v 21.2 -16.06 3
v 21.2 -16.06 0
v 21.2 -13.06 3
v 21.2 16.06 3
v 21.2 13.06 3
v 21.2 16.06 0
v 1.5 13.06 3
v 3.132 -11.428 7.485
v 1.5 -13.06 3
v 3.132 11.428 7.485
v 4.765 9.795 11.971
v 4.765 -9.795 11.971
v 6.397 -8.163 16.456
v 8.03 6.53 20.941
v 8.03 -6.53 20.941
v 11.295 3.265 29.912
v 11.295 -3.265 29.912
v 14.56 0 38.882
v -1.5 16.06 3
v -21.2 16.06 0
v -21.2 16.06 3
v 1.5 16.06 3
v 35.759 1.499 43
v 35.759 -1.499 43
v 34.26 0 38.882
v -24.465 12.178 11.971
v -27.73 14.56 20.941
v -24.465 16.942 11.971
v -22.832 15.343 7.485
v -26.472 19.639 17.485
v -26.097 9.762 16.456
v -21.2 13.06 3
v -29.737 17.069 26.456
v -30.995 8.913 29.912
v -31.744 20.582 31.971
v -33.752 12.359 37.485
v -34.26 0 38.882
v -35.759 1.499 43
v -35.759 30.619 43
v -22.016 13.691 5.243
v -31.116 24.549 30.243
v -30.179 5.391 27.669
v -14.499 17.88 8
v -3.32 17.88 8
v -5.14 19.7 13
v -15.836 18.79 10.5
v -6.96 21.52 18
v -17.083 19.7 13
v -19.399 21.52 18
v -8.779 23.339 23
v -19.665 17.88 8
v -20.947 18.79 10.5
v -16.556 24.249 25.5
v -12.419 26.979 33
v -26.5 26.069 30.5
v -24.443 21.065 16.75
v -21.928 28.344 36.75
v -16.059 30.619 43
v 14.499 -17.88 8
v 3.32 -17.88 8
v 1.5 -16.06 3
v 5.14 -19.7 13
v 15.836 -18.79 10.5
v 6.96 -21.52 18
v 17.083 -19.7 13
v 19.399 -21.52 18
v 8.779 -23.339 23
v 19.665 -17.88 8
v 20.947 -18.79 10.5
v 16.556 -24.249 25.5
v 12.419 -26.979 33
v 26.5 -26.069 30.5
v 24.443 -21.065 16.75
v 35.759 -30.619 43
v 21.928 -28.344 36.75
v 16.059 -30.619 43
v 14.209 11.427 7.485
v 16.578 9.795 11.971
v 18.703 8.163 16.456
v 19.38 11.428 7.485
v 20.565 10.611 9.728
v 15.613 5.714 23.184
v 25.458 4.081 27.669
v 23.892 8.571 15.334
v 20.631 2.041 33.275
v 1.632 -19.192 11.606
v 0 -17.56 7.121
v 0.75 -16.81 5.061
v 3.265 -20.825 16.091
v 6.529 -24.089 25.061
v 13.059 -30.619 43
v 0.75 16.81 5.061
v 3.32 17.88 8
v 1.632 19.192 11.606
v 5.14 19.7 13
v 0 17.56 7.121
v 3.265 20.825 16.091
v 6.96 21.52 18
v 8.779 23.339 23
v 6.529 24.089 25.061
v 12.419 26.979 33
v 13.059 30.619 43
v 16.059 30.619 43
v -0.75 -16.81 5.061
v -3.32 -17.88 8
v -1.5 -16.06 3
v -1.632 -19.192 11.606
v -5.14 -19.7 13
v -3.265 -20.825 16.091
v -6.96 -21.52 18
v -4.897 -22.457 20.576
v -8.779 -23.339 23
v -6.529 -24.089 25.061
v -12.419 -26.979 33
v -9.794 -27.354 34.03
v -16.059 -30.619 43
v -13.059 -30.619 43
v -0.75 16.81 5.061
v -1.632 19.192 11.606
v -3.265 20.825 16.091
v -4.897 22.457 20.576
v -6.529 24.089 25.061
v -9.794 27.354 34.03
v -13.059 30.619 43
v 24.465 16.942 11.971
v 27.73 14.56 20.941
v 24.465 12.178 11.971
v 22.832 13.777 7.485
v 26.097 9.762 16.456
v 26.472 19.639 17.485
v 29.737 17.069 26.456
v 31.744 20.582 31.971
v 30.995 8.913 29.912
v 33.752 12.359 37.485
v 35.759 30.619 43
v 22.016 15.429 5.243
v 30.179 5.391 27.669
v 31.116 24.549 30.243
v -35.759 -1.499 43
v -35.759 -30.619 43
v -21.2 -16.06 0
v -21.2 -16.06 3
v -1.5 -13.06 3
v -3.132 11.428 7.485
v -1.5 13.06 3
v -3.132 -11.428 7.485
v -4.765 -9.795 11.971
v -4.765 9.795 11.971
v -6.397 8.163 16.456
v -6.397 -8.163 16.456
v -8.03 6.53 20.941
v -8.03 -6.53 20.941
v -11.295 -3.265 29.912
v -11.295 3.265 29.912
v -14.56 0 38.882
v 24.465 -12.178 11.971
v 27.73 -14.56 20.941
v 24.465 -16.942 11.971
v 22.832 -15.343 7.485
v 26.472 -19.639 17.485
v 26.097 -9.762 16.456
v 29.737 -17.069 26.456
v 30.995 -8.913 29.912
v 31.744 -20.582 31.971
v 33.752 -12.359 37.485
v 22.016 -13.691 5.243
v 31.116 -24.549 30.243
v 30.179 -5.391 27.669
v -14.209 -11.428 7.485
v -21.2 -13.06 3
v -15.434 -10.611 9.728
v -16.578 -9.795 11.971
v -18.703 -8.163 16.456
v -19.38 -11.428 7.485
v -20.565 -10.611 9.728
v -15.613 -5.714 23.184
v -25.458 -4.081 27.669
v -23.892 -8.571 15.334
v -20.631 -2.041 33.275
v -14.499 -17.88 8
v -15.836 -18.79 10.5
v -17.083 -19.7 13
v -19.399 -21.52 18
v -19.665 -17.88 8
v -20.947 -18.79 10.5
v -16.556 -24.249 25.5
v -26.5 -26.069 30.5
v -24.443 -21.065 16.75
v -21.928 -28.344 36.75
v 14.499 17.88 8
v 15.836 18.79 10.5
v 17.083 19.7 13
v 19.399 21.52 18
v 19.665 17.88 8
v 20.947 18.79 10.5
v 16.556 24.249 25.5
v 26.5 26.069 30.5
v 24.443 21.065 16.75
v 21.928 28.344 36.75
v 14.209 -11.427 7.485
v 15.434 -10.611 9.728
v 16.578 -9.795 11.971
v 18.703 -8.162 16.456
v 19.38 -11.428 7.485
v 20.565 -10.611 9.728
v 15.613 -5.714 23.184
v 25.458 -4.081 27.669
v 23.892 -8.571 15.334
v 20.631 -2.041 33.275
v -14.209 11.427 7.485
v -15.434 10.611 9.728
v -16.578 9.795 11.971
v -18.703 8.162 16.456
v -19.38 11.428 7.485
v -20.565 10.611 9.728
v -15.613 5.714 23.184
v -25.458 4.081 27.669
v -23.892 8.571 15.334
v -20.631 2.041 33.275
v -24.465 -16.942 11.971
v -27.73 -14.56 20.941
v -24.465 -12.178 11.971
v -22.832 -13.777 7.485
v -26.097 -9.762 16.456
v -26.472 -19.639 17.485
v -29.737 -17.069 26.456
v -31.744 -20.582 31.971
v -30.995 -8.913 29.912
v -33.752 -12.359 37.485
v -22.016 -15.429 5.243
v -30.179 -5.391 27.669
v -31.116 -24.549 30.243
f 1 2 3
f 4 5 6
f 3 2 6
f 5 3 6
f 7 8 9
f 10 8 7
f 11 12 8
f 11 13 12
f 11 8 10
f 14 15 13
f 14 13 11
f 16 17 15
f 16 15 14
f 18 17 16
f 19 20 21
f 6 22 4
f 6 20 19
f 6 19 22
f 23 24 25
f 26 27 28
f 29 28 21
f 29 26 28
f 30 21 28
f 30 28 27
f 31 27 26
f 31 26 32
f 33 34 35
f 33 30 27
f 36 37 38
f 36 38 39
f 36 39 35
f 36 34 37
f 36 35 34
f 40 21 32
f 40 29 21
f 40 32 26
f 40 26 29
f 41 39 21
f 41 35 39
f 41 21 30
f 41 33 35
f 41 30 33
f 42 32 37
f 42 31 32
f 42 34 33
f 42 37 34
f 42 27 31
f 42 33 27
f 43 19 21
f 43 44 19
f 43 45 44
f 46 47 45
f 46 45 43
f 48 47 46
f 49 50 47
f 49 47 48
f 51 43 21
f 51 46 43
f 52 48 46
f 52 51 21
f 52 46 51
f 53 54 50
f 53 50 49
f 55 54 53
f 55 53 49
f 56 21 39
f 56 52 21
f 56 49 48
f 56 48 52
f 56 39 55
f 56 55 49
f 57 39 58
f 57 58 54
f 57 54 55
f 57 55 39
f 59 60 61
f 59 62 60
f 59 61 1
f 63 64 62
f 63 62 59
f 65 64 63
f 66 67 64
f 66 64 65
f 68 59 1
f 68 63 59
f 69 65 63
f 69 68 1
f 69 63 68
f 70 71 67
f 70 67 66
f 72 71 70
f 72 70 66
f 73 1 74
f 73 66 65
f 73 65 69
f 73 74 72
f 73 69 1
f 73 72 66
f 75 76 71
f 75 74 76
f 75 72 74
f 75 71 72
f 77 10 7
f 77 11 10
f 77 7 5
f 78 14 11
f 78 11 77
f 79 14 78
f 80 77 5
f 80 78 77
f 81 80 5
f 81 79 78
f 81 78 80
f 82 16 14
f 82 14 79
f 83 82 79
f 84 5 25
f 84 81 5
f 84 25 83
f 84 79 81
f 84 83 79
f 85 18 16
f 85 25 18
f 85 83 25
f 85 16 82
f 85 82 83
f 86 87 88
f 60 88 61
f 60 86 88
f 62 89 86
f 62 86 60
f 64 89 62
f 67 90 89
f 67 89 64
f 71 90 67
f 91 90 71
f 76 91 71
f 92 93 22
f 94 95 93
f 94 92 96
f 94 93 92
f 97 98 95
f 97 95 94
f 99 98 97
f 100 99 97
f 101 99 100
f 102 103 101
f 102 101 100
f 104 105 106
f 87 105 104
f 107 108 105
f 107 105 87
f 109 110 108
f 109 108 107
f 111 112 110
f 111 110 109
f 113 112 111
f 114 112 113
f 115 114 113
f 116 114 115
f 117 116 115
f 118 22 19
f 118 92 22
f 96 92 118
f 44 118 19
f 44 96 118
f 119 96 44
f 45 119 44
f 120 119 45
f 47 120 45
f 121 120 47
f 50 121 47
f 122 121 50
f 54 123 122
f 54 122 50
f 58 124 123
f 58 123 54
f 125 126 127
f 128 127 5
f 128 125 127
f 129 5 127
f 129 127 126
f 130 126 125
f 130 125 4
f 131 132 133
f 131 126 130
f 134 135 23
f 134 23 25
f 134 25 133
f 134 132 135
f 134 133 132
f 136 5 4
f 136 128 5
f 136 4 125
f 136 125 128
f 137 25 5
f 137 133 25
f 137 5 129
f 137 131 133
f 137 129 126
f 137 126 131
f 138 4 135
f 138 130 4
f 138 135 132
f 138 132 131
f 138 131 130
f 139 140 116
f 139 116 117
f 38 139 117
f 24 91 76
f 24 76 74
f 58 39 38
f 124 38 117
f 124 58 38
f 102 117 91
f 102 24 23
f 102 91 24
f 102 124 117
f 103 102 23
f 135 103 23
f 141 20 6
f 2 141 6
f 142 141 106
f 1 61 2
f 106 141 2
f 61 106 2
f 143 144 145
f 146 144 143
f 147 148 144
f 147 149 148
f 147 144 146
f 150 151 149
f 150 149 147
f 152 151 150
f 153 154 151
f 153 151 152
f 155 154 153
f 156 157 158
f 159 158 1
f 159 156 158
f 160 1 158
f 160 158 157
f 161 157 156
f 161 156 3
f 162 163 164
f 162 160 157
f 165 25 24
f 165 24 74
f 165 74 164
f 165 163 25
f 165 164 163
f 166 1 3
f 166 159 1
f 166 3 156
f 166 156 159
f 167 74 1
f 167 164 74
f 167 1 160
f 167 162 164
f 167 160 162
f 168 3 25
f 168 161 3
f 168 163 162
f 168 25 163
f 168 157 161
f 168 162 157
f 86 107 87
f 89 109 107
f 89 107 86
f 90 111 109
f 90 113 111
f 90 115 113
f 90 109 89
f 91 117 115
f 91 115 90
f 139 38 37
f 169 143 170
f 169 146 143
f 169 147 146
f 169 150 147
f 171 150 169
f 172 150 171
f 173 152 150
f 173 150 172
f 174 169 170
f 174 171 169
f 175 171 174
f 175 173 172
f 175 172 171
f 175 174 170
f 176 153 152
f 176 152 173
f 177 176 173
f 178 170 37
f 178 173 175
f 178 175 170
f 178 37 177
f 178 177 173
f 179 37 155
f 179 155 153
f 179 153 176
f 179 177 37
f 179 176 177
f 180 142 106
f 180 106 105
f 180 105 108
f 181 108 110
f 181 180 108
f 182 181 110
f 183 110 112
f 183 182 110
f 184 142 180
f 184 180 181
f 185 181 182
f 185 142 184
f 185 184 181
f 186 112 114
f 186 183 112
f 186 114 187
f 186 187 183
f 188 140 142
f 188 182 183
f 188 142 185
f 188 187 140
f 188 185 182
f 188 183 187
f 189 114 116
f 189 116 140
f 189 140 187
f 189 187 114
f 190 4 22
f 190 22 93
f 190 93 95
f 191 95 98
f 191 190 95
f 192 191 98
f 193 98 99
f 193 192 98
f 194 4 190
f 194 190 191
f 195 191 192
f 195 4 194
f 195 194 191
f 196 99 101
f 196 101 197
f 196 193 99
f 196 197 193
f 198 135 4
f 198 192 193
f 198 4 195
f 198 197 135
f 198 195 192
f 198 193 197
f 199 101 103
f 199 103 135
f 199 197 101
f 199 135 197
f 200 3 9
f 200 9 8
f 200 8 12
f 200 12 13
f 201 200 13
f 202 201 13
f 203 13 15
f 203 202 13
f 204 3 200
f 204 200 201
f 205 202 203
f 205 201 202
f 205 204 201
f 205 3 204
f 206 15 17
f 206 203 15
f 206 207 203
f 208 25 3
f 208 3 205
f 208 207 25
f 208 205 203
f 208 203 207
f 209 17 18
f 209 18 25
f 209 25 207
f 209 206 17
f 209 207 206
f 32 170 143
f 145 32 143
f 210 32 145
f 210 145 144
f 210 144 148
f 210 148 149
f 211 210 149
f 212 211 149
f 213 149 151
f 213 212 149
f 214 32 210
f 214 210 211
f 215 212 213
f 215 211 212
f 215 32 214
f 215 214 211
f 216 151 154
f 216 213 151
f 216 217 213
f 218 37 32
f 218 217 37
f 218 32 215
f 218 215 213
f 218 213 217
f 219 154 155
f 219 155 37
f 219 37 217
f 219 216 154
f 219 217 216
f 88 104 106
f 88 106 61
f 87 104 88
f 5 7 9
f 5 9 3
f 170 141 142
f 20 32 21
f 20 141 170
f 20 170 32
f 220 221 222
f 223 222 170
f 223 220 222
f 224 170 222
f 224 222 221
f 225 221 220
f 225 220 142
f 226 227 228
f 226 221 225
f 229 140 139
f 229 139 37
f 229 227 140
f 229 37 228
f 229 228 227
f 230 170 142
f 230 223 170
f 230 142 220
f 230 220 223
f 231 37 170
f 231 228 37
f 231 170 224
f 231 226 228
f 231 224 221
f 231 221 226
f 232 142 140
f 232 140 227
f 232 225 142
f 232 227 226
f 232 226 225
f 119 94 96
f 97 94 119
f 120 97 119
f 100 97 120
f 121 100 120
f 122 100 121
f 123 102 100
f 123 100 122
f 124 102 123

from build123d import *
from build123d.topology import SkipClean

# Parameters (mm, degrees)
SKETCH1_W           = 42.4
SKETCH1_H           = 32.12
BOSS_EXTRUDE1_DEPTH = 3
SKETCH2_W           = 42.4
SKETCH2_H           = 3
SKETCH2_W_2         = 3
SKETCH2_H_2         = 32.12
BOSS_EXTRUDE2_DEPTH = 40
BOSS_EXTRUDE2_TAPER = -20


with BuildPart() as part:
    # Sketch1 → Boss-Extrude1 (new body)
    with BuildSketch(Plane.XY):
        Rectangle(SKETCH1_W, SKETCH1_H)
    extrude(amount=BOSS_EXTRUDE1_DEPTH)

    # Sketch2 → Boss-Extrude2 (add)
    with SkipClean():  # the faces are left unmerged after this step: merging them gives an invalid solid
        with BuildSketch(Plane.XY.offset(3)):
            with Locations((0, 14.56)):
                Rectangle(SKETCH2_W, SKETCH2_H)
            with Locations((0, -14.56)):
                Rectangle(SKETCH2_W, SKETCH2_H)
            Rectangle(SKETCH2_W_2, SKETCH2_H_2)
        extrude(amount=BOSS_EXTRUDE2_DEPTH, taper=BOSS_EXTRUDE2_TAPER)
    add(part.part.scale(1), mode=Mode.REPLACE)  # the faces are merged on a copy


solid = part.part
